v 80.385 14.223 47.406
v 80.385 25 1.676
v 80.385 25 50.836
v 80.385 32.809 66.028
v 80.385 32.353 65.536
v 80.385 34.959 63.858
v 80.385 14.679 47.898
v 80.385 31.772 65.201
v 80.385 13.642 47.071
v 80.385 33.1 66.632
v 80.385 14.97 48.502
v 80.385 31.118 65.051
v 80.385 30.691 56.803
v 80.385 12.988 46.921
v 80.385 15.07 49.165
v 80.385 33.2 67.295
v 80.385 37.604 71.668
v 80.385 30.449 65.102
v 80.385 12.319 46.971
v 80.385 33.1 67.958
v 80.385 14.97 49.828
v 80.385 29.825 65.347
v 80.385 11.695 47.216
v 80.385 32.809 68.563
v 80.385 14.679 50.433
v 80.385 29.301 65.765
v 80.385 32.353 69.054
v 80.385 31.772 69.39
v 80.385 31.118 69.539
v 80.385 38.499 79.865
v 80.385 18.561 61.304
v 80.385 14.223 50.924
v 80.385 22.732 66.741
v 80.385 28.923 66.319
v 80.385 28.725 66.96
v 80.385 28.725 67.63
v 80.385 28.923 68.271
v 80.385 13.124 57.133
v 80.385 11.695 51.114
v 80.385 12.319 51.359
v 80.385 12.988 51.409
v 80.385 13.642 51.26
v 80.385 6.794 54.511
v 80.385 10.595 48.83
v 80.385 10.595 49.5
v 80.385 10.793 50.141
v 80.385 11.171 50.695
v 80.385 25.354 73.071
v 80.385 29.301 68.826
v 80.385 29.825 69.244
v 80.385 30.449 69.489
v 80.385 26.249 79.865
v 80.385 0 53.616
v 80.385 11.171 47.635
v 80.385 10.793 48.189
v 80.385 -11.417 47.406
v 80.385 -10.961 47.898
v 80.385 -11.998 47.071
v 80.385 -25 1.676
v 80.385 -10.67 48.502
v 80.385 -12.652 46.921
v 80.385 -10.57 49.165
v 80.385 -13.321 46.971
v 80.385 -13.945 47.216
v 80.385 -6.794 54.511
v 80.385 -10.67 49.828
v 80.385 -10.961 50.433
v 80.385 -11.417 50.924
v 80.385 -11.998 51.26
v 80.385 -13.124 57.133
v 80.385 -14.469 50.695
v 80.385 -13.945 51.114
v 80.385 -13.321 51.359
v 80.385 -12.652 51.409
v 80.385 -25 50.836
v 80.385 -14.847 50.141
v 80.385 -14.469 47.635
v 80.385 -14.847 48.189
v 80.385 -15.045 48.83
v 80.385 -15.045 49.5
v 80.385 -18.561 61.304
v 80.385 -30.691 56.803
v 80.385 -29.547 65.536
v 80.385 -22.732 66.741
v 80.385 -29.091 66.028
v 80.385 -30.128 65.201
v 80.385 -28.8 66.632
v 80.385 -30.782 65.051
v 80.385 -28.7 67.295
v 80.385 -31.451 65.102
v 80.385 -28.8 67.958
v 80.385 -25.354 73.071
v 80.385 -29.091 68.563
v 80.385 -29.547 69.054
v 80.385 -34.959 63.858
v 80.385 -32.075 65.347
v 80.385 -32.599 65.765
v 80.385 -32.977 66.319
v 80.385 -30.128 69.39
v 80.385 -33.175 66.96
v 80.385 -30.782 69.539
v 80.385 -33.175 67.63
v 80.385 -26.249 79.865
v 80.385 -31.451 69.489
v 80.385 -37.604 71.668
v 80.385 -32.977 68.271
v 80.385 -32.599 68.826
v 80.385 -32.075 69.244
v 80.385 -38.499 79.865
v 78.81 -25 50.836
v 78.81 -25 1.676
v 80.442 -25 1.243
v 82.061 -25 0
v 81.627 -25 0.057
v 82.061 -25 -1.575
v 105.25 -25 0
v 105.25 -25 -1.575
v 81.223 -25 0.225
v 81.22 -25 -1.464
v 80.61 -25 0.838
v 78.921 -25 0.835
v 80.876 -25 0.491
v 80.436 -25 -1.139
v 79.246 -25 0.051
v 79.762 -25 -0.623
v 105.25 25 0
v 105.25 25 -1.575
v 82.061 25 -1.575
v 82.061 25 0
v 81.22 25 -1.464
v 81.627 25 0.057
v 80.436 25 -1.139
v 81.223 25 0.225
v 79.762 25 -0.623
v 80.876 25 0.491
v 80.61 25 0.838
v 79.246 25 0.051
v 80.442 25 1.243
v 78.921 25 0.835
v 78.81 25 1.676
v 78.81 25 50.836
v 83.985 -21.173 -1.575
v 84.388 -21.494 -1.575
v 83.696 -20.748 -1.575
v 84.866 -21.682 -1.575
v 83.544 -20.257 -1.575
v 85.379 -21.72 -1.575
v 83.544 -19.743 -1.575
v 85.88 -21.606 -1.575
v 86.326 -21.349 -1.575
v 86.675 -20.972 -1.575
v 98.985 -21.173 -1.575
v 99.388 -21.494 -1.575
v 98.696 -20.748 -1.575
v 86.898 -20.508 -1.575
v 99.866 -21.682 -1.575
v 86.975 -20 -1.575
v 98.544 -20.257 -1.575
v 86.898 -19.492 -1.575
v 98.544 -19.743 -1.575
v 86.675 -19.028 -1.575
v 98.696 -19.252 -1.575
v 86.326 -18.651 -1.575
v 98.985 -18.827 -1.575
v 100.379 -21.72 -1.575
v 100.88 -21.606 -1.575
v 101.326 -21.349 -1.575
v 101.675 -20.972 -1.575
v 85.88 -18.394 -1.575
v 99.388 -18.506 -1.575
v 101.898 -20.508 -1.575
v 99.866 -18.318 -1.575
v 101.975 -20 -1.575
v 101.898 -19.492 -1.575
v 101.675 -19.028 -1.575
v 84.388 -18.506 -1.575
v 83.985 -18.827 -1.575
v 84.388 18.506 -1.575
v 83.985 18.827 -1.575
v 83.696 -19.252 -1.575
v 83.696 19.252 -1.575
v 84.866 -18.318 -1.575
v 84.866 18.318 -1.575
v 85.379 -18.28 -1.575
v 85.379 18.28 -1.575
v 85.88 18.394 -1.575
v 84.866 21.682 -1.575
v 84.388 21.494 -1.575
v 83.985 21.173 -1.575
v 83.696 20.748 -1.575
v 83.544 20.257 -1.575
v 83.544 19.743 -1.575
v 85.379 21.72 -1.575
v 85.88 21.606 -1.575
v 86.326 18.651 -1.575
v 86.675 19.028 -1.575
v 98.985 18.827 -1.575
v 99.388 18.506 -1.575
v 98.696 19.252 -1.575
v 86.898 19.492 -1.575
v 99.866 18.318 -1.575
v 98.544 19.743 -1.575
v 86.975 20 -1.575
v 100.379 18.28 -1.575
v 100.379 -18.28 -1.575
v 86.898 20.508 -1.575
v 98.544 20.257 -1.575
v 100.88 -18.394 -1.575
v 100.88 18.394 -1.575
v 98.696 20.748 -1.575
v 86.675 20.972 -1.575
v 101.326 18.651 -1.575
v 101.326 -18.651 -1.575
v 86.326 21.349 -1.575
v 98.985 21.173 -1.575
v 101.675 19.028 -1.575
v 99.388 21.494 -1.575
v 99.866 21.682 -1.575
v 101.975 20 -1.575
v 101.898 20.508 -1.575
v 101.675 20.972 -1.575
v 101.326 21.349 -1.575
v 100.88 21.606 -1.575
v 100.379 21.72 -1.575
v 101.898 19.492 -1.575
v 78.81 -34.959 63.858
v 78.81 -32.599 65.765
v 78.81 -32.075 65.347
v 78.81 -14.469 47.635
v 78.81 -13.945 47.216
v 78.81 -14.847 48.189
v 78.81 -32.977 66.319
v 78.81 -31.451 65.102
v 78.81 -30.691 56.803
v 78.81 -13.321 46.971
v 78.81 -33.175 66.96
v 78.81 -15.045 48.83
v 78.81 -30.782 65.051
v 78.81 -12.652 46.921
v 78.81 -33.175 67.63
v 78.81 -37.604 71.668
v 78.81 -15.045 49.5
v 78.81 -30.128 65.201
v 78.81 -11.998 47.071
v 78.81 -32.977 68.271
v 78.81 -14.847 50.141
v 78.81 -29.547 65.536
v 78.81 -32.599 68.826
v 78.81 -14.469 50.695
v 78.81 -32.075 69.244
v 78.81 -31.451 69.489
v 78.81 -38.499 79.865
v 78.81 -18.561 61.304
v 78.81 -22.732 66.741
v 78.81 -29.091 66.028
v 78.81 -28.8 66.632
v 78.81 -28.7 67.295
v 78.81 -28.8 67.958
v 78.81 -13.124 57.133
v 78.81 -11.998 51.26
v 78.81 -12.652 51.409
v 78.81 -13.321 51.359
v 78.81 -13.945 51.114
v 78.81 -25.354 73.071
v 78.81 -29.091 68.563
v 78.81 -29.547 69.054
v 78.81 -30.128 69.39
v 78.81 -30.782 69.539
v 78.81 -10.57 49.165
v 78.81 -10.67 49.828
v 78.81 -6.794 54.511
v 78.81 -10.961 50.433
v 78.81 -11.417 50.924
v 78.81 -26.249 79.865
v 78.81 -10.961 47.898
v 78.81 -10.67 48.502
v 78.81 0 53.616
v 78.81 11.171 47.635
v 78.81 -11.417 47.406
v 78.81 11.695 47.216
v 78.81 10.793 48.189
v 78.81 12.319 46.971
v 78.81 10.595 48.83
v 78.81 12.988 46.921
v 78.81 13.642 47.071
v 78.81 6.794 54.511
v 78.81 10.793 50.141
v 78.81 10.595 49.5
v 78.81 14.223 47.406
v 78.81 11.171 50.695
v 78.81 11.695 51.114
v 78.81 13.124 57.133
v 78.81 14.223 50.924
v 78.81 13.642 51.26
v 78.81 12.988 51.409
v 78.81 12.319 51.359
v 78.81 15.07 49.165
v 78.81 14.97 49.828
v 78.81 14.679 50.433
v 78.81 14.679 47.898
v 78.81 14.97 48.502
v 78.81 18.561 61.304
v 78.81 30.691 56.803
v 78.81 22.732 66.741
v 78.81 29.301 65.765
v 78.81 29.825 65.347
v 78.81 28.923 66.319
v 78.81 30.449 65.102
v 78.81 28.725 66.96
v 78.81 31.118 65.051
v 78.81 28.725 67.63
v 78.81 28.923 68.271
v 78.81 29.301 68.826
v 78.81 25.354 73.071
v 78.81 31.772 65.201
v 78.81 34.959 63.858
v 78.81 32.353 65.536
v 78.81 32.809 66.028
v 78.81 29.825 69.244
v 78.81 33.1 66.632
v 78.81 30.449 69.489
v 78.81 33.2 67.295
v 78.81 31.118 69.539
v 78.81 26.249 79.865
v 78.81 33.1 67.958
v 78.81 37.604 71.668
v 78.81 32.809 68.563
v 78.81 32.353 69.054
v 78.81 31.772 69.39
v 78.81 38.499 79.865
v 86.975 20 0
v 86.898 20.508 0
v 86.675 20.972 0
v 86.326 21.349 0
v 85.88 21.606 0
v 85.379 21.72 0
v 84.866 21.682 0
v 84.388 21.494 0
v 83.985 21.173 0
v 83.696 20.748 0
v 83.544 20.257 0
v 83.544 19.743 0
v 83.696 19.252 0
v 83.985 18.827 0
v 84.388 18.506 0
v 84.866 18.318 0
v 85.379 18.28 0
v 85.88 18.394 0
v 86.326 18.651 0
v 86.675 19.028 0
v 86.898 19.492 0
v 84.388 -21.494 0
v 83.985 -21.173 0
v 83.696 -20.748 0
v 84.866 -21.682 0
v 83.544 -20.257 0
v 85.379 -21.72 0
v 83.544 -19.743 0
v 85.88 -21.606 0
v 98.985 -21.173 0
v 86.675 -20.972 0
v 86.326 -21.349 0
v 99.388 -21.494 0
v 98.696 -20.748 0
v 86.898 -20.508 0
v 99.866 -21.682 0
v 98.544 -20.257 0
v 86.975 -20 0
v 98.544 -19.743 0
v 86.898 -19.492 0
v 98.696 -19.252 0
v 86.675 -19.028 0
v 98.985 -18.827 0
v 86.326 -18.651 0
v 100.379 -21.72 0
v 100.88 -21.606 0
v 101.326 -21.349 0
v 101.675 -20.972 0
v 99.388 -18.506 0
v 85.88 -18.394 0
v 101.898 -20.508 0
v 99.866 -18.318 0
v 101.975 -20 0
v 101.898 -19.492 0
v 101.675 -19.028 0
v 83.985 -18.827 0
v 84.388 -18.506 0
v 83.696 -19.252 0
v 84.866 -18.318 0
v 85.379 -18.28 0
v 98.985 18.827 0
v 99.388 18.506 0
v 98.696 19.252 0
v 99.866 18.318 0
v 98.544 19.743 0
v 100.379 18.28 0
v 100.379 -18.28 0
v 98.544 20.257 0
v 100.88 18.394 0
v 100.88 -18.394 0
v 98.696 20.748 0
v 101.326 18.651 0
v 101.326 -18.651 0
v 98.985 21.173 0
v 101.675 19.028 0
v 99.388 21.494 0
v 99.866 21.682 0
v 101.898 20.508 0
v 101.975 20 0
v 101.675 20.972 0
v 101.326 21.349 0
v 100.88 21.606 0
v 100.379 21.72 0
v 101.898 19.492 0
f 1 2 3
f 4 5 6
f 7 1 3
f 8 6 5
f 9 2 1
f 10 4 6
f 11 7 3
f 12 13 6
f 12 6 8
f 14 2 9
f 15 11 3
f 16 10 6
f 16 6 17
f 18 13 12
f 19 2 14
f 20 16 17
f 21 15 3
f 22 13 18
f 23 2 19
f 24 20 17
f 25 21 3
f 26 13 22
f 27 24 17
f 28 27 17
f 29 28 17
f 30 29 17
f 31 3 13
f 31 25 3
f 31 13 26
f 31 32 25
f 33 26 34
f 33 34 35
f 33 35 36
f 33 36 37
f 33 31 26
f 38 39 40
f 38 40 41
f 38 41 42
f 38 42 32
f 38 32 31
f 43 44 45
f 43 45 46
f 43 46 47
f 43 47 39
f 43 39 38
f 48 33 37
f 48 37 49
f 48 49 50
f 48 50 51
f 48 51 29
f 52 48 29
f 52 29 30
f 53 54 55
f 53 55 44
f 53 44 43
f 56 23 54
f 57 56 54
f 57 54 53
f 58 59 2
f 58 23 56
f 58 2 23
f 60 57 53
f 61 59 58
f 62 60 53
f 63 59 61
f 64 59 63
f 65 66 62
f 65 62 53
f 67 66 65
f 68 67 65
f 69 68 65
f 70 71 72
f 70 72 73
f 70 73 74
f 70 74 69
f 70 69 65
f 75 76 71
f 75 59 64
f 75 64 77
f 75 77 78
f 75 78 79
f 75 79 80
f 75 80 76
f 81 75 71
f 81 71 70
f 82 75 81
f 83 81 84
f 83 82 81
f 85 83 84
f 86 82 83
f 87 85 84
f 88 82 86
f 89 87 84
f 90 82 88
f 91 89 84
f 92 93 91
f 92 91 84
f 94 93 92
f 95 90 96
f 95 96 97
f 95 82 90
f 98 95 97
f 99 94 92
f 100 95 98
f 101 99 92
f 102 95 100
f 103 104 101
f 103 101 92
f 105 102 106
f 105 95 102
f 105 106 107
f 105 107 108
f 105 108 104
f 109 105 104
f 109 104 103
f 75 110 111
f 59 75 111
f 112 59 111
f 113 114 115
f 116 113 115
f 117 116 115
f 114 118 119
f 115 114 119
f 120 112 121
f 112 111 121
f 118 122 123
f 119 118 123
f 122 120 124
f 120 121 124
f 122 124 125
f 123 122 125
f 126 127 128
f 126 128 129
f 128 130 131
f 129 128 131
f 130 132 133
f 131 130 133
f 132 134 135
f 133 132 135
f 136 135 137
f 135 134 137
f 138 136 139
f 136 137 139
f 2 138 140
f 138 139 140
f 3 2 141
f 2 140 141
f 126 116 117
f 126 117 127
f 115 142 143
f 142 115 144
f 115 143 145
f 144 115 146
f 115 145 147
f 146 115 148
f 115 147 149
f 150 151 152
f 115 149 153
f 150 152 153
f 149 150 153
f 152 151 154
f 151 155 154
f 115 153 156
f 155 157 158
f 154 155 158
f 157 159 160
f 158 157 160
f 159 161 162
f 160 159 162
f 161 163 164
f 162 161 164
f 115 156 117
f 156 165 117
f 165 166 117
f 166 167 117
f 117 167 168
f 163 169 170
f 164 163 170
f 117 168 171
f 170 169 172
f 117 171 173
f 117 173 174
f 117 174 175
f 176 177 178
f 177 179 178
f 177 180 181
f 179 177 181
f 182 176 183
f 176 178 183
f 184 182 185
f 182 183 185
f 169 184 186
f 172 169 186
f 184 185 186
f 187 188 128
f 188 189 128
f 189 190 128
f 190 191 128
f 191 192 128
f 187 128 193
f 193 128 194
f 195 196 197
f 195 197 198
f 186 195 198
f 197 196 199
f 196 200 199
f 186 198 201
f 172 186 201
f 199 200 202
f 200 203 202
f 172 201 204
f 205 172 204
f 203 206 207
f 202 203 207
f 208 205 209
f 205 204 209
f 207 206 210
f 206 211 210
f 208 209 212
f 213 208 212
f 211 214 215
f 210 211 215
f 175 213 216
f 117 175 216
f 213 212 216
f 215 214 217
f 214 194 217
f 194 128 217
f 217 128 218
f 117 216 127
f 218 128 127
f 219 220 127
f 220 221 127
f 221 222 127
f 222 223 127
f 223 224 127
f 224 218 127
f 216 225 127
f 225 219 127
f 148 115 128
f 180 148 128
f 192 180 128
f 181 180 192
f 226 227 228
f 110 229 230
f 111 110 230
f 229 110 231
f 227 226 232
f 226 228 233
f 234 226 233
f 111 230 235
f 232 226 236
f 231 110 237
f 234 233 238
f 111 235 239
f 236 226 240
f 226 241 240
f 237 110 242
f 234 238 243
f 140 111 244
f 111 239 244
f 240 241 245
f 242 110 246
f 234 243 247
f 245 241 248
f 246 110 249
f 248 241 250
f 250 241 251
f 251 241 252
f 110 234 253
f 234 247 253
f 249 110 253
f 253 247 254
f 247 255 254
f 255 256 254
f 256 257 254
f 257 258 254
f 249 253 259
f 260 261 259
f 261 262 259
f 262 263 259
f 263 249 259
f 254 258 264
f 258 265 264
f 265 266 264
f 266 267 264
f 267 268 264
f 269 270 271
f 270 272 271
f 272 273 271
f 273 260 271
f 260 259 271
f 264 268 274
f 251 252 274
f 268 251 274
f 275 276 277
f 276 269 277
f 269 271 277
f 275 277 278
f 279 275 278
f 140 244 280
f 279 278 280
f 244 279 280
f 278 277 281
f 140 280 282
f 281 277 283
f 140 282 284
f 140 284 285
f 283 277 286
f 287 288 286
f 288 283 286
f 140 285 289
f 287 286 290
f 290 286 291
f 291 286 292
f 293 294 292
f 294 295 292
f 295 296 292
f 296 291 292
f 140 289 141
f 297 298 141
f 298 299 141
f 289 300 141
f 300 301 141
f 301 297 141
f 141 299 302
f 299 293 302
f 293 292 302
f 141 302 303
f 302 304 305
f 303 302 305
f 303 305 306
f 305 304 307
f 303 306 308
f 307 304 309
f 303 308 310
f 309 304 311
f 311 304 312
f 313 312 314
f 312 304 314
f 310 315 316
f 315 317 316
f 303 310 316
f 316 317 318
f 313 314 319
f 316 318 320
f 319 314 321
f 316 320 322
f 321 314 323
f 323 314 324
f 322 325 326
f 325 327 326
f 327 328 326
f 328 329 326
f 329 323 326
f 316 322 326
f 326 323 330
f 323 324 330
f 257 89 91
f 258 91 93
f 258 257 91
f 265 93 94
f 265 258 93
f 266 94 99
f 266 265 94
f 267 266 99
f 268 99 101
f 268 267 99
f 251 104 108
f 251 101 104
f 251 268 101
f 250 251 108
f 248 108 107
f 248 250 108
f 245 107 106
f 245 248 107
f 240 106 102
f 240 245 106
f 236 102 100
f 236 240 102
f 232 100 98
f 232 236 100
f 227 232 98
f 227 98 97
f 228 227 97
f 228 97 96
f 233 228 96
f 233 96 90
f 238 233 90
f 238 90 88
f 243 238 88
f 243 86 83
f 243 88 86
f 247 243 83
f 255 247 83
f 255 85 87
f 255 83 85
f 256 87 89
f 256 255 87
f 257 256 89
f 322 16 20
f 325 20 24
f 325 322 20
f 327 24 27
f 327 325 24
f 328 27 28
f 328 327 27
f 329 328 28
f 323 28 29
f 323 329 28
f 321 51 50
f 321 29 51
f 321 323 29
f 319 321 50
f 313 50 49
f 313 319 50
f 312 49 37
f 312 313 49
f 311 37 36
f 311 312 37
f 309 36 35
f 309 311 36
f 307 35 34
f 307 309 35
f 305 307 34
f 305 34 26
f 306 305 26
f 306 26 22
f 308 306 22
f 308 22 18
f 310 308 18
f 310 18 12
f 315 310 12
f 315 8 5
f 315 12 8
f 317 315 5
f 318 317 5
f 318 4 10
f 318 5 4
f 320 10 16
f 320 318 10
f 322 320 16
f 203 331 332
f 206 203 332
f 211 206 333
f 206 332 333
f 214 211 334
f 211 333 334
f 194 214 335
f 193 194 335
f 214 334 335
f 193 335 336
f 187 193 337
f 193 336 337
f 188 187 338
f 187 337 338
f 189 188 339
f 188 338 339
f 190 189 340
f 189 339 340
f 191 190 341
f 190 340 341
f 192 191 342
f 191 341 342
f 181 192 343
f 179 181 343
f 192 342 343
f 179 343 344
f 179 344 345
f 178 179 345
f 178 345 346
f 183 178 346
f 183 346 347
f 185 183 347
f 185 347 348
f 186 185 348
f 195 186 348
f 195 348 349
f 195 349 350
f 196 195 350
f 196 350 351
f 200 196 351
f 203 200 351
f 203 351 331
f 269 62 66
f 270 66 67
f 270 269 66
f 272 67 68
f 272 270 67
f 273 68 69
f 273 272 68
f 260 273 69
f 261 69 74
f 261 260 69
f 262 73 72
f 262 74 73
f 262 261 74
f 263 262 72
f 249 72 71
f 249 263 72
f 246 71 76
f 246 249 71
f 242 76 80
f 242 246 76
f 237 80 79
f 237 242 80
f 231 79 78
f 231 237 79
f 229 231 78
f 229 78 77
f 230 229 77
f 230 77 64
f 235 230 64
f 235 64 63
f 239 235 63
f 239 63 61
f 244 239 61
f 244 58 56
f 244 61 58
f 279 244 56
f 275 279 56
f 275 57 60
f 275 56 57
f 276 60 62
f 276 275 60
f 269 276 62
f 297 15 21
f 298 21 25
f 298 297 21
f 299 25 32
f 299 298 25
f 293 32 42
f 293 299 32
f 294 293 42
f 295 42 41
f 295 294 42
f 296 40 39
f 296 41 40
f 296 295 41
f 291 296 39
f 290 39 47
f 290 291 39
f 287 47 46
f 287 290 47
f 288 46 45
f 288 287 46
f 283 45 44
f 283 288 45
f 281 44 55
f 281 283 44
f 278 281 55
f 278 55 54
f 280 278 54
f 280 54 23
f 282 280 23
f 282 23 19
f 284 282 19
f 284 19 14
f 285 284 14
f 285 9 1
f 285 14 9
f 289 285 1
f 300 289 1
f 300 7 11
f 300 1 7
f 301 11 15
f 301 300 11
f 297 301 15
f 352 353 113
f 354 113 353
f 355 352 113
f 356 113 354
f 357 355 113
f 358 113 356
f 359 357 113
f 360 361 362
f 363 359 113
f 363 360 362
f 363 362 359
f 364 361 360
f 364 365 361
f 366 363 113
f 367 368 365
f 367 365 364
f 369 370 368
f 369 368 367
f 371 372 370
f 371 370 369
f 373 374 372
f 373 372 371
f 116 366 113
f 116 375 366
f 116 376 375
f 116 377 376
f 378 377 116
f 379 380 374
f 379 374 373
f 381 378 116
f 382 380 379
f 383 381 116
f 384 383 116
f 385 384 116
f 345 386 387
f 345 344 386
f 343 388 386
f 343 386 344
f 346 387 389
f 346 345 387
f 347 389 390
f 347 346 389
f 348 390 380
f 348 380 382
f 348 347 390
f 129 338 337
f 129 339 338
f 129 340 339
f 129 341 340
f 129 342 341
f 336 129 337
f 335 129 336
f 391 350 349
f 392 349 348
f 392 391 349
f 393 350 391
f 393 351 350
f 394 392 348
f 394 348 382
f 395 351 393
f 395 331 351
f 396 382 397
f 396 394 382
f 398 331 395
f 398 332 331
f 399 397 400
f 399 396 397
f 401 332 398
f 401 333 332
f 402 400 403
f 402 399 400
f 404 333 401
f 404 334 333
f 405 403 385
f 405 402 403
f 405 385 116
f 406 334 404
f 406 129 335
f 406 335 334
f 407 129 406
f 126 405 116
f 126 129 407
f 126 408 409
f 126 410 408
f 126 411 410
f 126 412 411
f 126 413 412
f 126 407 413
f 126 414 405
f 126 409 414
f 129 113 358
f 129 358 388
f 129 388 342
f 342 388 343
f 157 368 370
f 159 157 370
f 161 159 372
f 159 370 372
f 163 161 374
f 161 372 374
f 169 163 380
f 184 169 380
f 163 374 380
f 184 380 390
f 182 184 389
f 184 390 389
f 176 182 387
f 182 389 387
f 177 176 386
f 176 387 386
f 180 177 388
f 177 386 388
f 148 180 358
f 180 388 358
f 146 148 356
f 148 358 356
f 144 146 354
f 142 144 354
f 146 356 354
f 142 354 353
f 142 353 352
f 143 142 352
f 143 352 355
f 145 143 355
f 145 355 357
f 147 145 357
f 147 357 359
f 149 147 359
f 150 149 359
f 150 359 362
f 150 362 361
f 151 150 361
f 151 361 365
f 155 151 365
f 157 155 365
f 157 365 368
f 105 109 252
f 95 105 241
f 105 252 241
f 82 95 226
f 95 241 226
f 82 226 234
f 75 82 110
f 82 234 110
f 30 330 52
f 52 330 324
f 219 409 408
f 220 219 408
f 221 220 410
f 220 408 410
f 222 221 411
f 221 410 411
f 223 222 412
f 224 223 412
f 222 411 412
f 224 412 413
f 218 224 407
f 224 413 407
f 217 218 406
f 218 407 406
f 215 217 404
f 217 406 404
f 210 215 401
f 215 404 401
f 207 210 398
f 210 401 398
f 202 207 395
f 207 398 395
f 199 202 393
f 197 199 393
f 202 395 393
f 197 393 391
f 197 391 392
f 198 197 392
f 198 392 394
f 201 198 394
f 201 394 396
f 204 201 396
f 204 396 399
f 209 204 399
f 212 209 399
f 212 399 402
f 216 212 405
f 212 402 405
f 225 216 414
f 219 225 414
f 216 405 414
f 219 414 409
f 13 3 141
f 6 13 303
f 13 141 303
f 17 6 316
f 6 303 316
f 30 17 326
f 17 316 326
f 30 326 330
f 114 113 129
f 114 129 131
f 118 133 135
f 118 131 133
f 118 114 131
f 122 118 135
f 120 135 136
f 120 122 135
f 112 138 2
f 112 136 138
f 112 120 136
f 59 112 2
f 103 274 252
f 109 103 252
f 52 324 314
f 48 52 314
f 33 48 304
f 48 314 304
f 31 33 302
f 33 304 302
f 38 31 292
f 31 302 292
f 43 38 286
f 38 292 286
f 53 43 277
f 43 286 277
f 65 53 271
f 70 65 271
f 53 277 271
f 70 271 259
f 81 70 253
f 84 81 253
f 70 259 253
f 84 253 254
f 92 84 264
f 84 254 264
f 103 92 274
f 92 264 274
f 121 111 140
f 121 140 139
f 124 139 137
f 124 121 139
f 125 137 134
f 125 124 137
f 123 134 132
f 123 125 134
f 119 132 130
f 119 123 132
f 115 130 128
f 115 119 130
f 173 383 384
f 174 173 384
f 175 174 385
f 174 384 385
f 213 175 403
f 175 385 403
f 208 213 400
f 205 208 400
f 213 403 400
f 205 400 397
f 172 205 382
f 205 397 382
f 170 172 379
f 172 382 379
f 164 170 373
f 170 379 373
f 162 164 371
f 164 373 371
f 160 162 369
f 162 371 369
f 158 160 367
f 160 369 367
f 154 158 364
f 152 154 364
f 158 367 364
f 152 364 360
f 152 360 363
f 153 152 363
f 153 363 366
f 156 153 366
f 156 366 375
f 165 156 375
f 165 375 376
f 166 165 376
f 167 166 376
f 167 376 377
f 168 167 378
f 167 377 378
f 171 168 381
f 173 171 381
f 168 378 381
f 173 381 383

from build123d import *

# Parameters (mm, degrees)
SKETCH1_R                  = 2.25
SKETCH1_R_2                = 1.725
BASE_FLANGE1_DEPTH         = 1.5748
SKETCHED_START             = 0.25
SKETCHED_BEND1_OUTLINE_W   = 50
SKETCHED_BEND1_OUTLINE_H   = 1.5748
SKETCHED_BEND1_DEPTH       = 78.867027748
SKETCHED_START_2           = 78.810179492
SKETCHED_BEND1_2_OUTLINE_R = 2.25
SKETCHED_BEND1_2_DEPTH     = 3.2512
SKETCHED_START_3           = -39
SKETCHED_BEND1_3_DEPTH     = 78


with BuildPart() as part:
    # Base-Flange1: sheet metal written as solids
    # Sketch1 → Base-Flange1 (new body)
    with BuildSketch(Plane.XY):
        with BuildLine():
            Line((0.25, 38.499188303), (0.25, 26.248809497))
            ThreePointArc((0.25, 26.248809497), (26.498809497, 0), (0.25, -26.248809497))
            Line((0.25, -26.248809497), (0.25, -38.499188303))
            ThreePointArc((0.25, -38.499188303), (16.257038834, -34.95934997), (29.278831944, -25))
            Line((29.278831944, -25), (80.25, -25))
            Line((80.25, -25), (105.25, -25))
            Line((105.25, -25), (105.25, 25))
            Line((105.25, 25), (80.25, 25))
            Line((80.25, 25), (29.278831944, 25))
            ThreePointArc((29.278831944, 25), (16.257038834, 34.95934997), (0.25, 38.499188303))
        make_face()
        with Locations((12.819894984, 30.949964339)):
            Circle(SKETCH1_R, mode=Mode.SUBTRACT)
        with Locations((30.949964339, 12.819894984)):
            Circle(SKETCH1_R, mode=Mode.SUBTRACT)
        with Locations((30.949964339, -12.819894984)):
            Circle(SKETCH1_R, mode=Mode.SUBTRACT)
        with Locations((12.819894984, -30.949964339)):
            Circle(SKETCH1_R, mode=Mode.SUBTRACT)
        with Locations((100.25, 20)):
            Circle(SKETCH1_R_2, mode=Mode.SUBTRACT)
        with Locations((85.25, 20)):
            Circle(SKETCH1_R_2, mode=Mode.SUBTRACT)
        with Locations((85.25, -20)):
            Circle(SKETCH1_R_2, mode=Mode.SUBTRACT)
        with Locations((100.25, -20)):
            Circle(SKETCH1_R_2, mode=Mode.SUBTRACT)
    extrude(amount=-BASE_FLANGE1_DEPTH)

    # Sketched Bend1: read off the stored shape, not the designer's step
    # Sketched Bend1 outline → Sketched Bend1 (cut)
    with BuildSketch(Plane.YZ.offset(SKETCHED_START)):
        with Locations((0, -0.7874)):
            Rectangle(SKETCHED_BEND1_OUTLINE_W, SKETCHED_BEND1_OUTLINE_H)
    extrude(amount=SKETCHED_BEND1_DEPTH, mode=Mode.SUBTRACT)

    # Sketched Bend1 2 outline → Sketched Bend1 2 (add)
    with BuildSketch(Plane.YZ.offset(SKETCHED_START_2)):
        with BuildLine():
            Line((25, 0), (25, 50.836188564))
            ThreePointArc((25, 50.836188564), (34.95934997, 63.857981674), (38.499188303, 79.865020508))
            Line((38.499188303, 79.865020508), (26.248809497, 79.865020508))
            ThreePointArc((26.248809497, 79.865020508), (0, 53.616211011), (-26.248809497, 79.865020508))
            Line((-26.248809497, 79.865020508), (-38.499188303, 79.865020508))
            ThreePointArc((-38.499188303, 79.865020508), (-34.95934997, 63.857981674), (-25, 50.836188564))
            Line((-25, 50.836188564), (-25, 0))
            Line((-25, 0), (25, 0))
        make_face()
        with Locations((-12.819894984, 49.165056169)):
            Circle(SKETCHED_BEND1_2_OUTLINE_R, mode=Mode.SUBTRACT)
        with Locations((-30.949964339, 67.295125524)):
            Circle(SKETCHED_BEND1_2_OUTLINE_R, mode=Mode.SUBTRACT)
        with Locations((12.819894984, 49.165056169)):
            Circle(SKETCHED_BEND1_2_OUTLINE_R, mode=Mode.SUBTRACT)
        with Locations((30.949964339, 67.295125524)):
            Circle(SKETCHED_BEND1_2_OUTLINE_R, mode=Mode.SUBTRACT)
    extrude(amount=SKETCHED_BEND1_2_DEPTH)

    # Sketched Bend1 3 outline → Sketched Bend1 3 (cut)
    with BuildSketch(Plane(origin=(0, 0, 0), x_dir=(1, 0, 0), z_dir=(0, 1, 0)).offset(SKETCHED_START_3)):
        with BuildLine():
            ThreePointArc((82.061379492, 0), (80.875985684, -0.491006192), (80.384979492, -1.6764))
            Line((80.384979492, -1.6764), (80.384979492, -79.865020508))
            Line((80.384979492, -79.865020508), (82.061379492, -79.865020508))
            Line((82.061379492, -79.865020508), (82.061379492, 0))
        make_face()
        with BuildLine():
            Line((78.810179493, -81), (78.810179492, -1.6764))
            ThreePointArc((78.810179492, -1.6764), (79.762433925, 0.622545567), (82.061379492, 1.5748))
            Line((82.061379492, 1.5748), (84, 1.5748))
            Line((84, 1.5748), (84, 3))
            Line((84, 3), (-1, 3))
            Line((-1, 3), (-1, -81))
            Line((-1, -81), (78.810179493, -81))
        make_face()
    extrude(amount=SKETCHED_BEND1_3_DEPTH, mode=Mode.SUBTRACT)


solid = part.part
